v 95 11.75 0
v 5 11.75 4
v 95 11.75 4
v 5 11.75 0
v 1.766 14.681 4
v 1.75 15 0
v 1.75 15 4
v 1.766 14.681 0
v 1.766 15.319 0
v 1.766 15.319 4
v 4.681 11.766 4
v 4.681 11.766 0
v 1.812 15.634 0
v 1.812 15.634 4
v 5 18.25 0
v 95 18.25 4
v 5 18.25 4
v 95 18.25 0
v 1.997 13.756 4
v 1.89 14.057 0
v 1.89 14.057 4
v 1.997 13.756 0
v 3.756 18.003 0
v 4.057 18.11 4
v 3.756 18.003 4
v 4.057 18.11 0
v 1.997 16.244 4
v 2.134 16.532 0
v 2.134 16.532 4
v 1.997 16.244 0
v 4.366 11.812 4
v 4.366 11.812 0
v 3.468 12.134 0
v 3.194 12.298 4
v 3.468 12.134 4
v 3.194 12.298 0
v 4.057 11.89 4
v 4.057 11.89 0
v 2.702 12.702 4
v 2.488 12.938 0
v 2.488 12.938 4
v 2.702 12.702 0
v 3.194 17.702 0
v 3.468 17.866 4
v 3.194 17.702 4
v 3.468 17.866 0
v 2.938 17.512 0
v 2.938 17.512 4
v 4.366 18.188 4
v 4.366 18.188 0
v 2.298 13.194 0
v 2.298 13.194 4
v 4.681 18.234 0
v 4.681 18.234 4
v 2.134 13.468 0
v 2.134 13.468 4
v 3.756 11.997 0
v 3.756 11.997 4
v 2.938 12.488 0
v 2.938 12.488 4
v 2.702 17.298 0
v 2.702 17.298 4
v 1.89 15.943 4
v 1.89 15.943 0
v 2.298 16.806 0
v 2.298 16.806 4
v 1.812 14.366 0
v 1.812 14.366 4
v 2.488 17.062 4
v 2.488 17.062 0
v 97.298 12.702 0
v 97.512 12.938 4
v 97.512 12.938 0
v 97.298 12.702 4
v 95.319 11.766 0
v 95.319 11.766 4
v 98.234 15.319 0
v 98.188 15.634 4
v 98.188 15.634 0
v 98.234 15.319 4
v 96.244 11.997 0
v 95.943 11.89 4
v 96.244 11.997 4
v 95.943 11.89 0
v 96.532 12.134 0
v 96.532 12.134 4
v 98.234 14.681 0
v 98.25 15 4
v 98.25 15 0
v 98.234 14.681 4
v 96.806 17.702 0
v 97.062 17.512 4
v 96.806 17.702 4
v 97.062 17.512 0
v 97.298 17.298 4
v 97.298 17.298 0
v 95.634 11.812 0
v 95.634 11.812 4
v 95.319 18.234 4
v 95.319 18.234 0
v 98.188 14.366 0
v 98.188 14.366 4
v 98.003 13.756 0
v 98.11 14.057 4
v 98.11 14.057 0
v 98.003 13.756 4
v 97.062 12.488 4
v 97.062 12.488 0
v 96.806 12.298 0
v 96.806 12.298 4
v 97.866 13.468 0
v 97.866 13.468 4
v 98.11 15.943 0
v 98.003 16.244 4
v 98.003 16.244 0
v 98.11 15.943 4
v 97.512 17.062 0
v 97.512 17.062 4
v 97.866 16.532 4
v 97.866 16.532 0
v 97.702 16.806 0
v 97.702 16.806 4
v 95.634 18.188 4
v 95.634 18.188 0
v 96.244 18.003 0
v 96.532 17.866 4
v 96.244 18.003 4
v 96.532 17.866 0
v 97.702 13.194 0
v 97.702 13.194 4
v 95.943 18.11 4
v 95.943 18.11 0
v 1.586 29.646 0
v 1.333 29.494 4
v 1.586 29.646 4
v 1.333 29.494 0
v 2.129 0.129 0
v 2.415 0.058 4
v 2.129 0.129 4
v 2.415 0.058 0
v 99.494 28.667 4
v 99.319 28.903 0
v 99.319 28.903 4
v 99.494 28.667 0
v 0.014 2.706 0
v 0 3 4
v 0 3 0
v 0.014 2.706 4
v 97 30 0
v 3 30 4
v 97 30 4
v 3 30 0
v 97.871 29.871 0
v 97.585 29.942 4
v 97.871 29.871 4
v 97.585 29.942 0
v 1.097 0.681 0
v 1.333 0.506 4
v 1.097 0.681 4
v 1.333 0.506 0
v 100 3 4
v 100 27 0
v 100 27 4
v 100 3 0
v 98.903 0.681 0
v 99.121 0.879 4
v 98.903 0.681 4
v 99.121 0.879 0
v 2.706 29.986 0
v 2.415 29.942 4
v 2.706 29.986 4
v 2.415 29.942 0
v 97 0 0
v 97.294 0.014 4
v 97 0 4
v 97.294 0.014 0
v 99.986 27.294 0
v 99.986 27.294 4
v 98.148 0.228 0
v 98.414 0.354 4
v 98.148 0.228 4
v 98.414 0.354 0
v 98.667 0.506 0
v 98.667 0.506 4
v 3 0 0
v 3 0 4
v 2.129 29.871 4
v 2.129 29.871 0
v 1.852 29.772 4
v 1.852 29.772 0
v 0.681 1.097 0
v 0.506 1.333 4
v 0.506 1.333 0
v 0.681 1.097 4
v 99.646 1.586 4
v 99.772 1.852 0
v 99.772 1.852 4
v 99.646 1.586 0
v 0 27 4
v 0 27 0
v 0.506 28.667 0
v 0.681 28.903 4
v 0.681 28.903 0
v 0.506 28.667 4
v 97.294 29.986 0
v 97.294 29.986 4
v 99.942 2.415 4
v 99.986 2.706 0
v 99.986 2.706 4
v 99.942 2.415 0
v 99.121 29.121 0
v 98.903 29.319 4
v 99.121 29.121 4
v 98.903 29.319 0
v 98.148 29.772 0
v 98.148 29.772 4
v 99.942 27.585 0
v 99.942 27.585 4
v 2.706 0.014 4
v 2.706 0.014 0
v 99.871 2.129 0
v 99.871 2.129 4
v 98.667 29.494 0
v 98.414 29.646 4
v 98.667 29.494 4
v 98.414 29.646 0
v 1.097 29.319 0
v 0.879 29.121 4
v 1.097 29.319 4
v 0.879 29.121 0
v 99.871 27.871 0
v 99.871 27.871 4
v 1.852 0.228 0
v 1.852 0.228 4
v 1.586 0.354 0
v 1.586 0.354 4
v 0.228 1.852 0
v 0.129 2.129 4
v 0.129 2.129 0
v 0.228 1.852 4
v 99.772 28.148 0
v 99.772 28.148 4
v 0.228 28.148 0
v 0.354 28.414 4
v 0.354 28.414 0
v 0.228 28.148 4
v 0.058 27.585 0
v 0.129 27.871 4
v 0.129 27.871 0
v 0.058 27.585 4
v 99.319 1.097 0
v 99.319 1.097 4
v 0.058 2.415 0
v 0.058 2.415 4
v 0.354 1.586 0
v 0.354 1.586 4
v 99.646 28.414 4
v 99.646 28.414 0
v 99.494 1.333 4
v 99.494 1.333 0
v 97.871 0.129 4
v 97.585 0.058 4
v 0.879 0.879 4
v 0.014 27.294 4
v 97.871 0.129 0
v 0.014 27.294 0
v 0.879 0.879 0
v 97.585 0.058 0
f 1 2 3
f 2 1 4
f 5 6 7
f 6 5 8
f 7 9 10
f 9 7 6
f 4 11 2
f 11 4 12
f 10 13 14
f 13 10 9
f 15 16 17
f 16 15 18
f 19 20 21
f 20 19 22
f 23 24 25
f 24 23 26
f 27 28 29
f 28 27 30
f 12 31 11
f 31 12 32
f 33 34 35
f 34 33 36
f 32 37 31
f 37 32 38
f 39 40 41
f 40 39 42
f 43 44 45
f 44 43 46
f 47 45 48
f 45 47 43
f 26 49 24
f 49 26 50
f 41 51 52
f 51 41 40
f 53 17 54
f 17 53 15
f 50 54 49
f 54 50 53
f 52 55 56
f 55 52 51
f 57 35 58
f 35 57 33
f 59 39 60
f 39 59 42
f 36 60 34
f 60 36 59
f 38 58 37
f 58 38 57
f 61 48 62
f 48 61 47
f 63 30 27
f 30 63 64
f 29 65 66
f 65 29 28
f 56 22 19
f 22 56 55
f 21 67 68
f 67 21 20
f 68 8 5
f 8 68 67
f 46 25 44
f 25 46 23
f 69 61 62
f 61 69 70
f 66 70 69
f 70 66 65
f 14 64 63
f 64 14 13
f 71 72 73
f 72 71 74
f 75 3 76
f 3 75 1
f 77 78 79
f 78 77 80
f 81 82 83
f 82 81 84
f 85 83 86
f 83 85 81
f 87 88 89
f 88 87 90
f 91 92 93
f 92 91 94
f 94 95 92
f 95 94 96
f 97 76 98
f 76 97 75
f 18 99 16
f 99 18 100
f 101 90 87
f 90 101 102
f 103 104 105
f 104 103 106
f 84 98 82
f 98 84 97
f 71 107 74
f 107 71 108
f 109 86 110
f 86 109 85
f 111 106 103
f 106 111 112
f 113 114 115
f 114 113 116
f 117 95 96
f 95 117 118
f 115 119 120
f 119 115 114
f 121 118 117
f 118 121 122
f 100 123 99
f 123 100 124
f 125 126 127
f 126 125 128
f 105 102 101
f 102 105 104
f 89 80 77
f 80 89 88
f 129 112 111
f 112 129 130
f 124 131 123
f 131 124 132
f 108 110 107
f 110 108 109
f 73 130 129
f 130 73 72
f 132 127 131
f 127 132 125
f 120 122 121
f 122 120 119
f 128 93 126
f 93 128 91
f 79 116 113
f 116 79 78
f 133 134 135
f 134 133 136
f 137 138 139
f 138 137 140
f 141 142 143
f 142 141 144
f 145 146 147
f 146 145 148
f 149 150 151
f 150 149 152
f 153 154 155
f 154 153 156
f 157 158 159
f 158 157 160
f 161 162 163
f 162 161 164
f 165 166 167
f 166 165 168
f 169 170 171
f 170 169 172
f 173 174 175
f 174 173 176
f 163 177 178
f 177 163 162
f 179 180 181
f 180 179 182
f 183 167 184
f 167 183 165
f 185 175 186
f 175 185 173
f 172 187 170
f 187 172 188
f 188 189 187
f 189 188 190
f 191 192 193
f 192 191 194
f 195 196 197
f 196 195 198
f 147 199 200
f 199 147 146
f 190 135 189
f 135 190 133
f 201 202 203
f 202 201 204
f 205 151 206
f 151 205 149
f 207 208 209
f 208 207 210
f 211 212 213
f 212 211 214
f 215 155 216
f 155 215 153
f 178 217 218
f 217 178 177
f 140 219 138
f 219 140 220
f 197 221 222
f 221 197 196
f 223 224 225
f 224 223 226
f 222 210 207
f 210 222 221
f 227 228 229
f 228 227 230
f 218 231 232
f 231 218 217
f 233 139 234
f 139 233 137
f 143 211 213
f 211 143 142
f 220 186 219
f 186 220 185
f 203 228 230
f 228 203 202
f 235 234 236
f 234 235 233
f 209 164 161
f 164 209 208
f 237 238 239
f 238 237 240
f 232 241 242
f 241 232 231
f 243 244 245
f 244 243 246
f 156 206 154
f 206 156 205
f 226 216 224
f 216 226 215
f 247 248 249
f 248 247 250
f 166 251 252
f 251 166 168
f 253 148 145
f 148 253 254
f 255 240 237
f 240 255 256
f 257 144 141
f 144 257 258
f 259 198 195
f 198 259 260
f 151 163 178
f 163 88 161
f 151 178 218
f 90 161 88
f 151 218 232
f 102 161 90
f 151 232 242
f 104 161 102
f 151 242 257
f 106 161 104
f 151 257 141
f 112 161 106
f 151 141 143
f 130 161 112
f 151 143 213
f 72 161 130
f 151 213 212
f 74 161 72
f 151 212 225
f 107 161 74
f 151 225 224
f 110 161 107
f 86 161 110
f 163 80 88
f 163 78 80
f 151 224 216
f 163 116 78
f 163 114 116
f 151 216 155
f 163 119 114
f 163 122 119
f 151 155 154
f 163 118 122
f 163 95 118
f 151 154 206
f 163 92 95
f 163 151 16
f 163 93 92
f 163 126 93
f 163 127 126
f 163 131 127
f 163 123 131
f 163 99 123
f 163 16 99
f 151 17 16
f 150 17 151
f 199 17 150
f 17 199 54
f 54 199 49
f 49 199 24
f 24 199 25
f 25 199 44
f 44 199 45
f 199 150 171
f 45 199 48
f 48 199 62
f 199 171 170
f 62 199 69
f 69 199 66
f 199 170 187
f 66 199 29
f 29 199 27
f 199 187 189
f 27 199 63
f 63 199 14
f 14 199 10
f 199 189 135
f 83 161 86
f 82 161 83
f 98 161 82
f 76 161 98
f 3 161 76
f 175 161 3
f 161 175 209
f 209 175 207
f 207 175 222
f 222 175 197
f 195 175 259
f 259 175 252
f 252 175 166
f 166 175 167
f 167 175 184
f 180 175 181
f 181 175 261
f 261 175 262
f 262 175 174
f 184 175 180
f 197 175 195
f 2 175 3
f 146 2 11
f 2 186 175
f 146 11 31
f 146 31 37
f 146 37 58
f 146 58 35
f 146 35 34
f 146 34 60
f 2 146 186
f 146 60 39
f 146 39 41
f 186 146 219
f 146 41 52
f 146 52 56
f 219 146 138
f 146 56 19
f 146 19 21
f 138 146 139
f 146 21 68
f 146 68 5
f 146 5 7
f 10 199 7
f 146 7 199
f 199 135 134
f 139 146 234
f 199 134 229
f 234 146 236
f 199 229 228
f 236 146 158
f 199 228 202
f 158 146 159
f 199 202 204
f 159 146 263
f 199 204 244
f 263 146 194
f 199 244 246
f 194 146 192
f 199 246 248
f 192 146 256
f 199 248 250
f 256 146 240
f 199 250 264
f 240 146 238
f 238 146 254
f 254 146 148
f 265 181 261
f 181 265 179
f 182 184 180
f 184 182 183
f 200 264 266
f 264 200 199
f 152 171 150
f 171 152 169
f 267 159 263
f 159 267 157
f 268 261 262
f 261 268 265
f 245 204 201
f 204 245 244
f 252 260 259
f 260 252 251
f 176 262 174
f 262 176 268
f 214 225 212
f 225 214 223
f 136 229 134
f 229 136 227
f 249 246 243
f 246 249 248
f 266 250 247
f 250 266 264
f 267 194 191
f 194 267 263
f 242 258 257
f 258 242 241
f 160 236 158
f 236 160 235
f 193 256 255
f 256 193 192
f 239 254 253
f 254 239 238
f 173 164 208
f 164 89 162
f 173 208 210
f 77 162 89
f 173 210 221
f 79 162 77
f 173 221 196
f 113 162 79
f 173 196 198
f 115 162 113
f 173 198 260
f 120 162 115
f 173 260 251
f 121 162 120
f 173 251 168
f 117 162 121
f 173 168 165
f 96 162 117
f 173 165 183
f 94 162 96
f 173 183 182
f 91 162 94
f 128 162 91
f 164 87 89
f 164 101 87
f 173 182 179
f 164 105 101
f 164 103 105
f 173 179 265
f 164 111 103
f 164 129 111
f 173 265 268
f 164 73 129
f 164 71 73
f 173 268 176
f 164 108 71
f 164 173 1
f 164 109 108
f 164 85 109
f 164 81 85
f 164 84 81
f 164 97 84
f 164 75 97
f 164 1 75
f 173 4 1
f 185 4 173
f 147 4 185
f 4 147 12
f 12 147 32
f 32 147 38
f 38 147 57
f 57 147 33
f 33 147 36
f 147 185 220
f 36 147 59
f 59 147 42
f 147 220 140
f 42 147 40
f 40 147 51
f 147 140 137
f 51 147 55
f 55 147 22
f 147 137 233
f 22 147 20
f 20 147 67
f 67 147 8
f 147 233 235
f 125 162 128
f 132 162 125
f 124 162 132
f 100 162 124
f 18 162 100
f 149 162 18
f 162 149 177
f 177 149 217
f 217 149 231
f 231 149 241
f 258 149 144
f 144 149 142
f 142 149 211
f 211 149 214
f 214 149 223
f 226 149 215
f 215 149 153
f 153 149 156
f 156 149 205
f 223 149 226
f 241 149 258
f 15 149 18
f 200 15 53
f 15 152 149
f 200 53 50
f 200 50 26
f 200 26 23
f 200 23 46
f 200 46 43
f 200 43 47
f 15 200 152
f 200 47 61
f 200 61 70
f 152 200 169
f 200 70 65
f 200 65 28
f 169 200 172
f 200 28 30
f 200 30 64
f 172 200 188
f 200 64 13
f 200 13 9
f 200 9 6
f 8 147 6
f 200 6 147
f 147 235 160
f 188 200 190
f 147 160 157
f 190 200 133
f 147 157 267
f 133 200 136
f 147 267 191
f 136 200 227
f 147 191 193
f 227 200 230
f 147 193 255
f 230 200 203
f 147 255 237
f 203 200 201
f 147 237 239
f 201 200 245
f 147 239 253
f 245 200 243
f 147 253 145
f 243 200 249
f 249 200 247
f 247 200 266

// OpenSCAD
// Original MechIntel educational model. CC0-1.0. Units: mm.
// Not a standardized or load-rated component.
$fn=96;
length=100; width=30; thickness=4; corner=3; slot=6.5; pitch=30;
$fn=64;
difference(){
 hull(){for(x=[corner,length-corner]) for(y=[corner,width-corner]) translate([x,y,0]) cylinder(r=corner,h=thickness);}
 for(x=[20,50,80]) hull(){translate([x-pitch/2, width/2,-1]) cylinder(d=slot,h=thickness+2);translate([x+pitch/2, width/2,-1]) cylinder(d=slot,h=thickness+2);}
}
